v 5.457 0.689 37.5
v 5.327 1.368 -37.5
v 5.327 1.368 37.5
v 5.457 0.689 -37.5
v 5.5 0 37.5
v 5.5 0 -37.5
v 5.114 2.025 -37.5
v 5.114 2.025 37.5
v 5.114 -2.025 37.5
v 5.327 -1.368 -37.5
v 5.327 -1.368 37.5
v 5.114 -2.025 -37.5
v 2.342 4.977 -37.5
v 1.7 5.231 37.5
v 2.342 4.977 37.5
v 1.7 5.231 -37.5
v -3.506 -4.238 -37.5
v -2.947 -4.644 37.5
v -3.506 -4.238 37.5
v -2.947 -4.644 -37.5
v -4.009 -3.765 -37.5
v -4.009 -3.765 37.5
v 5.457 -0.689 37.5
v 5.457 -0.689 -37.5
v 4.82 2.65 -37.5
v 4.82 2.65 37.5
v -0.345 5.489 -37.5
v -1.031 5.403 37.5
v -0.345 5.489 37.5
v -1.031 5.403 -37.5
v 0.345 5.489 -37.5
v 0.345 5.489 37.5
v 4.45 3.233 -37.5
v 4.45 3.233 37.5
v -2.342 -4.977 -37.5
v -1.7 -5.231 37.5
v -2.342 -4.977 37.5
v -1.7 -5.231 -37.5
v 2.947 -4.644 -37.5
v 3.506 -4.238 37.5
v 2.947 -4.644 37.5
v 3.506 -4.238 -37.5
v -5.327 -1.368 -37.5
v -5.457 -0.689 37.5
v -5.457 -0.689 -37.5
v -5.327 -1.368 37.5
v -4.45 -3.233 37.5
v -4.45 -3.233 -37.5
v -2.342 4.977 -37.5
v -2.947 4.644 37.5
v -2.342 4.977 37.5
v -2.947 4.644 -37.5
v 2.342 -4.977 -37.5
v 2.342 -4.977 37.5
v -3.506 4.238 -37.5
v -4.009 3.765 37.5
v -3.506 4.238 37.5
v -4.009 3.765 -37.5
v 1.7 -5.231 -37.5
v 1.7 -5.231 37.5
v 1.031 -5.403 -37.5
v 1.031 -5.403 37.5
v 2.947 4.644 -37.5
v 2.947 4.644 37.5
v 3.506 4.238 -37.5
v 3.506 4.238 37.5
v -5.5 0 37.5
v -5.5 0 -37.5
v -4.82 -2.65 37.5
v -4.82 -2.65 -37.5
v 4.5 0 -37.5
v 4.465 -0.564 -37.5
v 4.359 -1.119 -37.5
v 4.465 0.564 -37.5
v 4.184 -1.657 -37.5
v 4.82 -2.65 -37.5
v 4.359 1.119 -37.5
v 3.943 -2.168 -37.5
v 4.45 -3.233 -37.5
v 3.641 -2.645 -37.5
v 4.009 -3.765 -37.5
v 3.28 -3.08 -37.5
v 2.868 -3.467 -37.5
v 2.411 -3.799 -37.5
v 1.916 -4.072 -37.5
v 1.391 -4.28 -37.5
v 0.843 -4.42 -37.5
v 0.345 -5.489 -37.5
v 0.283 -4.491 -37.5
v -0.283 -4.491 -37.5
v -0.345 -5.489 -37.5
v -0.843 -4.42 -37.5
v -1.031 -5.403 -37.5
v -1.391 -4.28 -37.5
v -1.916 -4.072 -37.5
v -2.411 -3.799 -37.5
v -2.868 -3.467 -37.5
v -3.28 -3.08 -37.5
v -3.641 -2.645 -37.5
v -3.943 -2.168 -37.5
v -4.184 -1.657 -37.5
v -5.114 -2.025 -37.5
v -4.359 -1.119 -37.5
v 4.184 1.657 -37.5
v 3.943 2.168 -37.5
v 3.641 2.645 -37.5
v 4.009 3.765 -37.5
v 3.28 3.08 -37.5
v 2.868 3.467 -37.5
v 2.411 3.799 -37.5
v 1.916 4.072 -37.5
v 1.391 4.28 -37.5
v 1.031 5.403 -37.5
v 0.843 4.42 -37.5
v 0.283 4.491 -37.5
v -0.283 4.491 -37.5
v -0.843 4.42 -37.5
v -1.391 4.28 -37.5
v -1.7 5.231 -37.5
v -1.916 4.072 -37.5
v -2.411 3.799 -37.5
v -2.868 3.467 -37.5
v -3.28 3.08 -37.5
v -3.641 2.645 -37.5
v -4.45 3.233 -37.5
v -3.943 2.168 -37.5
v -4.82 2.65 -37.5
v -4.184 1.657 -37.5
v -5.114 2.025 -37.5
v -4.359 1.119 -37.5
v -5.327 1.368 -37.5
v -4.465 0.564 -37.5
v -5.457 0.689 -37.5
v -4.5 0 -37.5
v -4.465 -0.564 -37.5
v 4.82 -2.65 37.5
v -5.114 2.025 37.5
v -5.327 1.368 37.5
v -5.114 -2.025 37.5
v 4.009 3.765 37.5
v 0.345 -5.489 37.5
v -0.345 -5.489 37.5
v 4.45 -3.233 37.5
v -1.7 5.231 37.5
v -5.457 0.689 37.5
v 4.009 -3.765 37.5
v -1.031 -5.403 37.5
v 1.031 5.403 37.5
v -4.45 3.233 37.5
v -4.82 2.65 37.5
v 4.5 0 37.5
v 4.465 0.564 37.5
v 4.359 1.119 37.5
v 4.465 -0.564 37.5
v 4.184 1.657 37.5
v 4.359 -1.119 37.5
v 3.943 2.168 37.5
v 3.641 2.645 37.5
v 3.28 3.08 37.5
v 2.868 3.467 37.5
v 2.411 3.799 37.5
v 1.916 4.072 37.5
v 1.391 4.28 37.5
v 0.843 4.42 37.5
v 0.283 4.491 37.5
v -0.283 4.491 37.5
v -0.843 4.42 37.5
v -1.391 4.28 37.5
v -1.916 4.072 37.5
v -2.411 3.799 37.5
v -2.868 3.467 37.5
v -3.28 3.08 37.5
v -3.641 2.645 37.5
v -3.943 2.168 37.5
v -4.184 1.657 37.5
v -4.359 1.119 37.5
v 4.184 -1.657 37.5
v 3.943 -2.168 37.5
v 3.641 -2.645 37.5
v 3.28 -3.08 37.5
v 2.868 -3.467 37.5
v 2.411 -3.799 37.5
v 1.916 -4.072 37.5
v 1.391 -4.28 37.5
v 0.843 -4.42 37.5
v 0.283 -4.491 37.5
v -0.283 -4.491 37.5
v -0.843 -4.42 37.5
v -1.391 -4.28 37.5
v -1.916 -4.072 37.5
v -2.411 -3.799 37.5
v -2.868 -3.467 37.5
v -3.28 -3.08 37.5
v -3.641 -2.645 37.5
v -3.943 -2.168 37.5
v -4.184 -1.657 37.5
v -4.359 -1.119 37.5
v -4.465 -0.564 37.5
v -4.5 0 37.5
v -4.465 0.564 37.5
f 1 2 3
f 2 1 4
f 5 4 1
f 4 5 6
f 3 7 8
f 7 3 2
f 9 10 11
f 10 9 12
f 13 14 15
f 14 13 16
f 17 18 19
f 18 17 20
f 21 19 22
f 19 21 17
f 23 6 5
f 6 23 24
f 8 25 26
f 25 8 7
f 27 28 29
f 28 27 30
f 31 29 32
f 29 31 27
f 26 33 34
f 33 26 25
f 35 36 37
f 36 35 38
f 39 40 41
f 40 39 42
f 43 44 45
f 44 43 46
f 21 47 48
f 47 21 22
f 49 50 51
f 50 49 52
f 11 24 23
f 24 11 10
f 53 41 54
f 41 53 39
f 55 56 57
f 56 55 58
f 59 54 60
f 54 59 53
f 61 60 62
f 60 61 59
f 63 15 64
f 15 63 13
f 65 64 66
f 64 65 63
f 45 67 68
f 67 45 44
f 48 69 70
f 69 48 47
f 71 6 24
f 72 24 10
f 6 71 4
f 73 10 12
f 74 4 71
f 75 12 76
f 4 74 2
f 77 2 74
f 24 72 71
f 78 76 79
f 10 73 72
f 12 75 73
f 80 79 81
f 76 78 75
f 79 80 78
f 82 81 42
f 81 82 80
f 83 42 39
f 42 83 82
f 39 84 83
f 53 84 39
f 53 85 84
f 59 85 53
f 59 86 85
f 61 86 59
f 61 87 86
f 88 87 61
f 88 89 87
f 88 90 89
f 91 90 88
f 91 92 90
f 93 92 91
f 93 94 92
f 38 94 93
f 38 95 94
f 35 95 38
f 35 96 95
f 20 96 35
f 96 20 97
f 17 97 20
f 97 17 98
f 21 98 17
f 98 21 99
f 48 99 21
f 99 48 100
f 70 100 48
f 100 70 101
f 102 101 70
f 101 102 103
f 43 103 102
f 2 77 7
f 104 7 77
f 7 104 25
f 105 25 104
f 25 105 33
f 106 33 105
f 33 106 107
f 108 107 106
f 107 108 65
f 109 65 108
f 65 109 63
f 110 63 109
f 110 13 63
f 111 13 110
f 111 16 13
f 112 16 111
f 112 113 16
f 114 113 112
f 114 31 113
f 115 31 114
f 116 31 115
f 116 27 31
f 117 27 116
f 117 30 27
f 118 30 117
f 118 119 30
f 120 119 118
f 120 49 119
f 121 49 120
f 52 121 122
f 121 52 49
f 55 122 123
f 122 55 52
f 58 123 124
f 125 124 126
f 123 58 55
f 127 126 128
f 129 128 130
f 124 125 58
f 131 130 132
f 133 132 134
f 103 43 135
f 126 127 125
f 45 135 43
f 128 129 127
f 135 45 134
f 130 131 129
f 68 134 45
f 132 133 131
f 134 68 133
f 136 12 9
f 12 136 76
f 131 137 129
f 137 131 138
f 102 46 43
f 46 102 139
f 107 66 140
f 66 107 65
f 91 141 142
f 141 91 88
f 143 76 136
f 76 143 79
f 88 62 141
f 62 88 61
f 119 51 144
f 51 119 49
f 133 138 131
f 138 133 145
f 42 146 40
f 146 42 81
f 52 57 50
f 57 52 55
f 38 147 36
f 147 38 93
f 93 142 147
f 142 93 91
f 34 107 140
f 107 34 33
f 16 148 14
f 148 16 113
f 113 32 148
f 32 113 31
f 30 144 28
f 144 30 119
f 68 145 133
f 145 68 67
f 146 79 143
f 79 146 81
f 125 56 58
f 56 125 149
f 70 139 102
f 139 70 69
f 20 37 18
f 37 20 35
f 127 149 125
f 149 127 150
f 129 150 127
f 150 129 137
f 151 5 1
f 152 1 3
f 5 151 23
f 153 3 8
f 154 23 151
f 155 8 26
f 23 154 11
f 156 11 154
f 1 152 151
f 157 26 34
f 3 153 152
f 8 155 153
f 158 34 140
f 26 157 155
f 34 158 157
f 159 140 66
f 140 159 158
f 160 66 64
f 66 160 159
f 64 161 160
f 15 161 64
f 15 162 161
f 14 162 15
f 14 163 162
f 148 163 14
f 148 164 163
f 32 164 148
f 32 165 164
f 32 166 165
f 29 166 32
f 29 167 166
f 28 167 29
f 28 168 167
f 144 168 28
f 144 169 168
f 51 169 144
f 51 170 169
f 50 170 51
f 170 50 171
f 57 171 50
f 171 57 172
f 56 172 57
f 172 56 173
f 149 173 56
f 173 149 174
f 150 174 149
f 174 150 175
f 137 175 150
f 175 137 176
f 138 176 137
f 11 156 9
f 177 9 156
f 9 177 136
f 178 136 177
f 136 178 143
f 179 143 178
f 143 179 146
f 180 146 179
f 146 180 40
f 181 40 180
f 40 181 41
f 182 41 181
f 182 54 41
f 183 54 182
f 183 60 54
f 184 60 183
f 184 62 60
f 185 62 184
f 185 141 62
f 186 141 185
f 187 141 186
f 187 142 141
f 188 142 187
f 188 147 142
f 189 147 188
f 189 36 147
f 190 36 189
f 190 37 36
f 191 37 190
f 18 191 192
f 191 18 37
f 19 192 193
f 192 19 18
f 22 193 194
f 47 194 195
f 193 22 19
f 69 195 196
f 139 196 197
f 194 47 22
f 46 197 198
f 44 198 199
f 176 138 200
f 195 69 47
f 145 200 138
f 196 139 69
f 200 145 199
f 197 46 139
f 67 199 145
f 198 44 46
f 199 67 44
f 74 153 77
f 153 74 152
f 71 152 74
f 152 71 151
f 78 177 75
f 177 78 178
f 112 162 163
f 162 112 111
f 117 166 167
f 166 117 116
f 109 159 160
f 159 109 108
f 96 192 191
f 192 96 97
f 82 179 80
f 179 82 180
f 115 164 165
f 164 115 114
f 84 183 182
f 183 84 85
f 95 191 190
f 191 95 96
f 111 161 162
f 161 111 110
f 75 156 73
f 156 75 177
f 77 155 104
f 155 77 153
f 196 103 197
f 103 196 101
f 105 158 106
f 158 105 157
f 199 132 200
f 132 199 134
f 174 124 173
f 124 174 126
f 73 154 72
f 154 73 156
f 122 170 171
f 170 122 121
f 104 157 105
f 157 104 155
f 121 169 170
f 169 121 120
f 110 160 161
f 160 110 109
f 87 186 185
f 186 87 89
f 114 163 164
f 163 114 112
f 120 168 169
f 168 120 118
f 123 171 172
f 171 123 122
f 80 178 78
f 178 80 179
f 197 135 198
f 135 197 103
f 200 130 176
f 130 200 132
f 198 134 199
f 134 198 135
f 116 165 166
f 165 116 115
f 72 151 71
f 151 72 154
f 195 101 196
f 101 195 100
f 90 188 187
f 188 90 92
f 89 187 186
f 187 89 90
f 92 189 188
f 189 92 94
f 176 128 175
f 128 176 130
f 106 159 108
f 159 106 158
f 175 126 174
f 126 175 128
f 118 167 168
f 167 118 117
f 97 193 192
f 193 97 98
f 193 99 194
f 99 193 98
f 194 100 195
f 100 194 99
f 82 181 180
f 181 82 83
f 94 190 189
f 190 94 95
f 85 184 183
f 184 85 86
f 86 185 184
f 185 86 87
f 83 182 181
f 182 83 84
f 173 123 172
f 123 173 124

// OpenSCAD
$fn = 50;


difference() {
	union() {
		translate(v = [0, 0, -37.5000000000]) {
			cylinder(h = 75, r = 5.5000000000);
		}
	}
	union() {
		translate(v = [0, 0, -100.0000000000]) {
			cylinder(h = 200, r = 4.5000000000);
		}
	}
}
